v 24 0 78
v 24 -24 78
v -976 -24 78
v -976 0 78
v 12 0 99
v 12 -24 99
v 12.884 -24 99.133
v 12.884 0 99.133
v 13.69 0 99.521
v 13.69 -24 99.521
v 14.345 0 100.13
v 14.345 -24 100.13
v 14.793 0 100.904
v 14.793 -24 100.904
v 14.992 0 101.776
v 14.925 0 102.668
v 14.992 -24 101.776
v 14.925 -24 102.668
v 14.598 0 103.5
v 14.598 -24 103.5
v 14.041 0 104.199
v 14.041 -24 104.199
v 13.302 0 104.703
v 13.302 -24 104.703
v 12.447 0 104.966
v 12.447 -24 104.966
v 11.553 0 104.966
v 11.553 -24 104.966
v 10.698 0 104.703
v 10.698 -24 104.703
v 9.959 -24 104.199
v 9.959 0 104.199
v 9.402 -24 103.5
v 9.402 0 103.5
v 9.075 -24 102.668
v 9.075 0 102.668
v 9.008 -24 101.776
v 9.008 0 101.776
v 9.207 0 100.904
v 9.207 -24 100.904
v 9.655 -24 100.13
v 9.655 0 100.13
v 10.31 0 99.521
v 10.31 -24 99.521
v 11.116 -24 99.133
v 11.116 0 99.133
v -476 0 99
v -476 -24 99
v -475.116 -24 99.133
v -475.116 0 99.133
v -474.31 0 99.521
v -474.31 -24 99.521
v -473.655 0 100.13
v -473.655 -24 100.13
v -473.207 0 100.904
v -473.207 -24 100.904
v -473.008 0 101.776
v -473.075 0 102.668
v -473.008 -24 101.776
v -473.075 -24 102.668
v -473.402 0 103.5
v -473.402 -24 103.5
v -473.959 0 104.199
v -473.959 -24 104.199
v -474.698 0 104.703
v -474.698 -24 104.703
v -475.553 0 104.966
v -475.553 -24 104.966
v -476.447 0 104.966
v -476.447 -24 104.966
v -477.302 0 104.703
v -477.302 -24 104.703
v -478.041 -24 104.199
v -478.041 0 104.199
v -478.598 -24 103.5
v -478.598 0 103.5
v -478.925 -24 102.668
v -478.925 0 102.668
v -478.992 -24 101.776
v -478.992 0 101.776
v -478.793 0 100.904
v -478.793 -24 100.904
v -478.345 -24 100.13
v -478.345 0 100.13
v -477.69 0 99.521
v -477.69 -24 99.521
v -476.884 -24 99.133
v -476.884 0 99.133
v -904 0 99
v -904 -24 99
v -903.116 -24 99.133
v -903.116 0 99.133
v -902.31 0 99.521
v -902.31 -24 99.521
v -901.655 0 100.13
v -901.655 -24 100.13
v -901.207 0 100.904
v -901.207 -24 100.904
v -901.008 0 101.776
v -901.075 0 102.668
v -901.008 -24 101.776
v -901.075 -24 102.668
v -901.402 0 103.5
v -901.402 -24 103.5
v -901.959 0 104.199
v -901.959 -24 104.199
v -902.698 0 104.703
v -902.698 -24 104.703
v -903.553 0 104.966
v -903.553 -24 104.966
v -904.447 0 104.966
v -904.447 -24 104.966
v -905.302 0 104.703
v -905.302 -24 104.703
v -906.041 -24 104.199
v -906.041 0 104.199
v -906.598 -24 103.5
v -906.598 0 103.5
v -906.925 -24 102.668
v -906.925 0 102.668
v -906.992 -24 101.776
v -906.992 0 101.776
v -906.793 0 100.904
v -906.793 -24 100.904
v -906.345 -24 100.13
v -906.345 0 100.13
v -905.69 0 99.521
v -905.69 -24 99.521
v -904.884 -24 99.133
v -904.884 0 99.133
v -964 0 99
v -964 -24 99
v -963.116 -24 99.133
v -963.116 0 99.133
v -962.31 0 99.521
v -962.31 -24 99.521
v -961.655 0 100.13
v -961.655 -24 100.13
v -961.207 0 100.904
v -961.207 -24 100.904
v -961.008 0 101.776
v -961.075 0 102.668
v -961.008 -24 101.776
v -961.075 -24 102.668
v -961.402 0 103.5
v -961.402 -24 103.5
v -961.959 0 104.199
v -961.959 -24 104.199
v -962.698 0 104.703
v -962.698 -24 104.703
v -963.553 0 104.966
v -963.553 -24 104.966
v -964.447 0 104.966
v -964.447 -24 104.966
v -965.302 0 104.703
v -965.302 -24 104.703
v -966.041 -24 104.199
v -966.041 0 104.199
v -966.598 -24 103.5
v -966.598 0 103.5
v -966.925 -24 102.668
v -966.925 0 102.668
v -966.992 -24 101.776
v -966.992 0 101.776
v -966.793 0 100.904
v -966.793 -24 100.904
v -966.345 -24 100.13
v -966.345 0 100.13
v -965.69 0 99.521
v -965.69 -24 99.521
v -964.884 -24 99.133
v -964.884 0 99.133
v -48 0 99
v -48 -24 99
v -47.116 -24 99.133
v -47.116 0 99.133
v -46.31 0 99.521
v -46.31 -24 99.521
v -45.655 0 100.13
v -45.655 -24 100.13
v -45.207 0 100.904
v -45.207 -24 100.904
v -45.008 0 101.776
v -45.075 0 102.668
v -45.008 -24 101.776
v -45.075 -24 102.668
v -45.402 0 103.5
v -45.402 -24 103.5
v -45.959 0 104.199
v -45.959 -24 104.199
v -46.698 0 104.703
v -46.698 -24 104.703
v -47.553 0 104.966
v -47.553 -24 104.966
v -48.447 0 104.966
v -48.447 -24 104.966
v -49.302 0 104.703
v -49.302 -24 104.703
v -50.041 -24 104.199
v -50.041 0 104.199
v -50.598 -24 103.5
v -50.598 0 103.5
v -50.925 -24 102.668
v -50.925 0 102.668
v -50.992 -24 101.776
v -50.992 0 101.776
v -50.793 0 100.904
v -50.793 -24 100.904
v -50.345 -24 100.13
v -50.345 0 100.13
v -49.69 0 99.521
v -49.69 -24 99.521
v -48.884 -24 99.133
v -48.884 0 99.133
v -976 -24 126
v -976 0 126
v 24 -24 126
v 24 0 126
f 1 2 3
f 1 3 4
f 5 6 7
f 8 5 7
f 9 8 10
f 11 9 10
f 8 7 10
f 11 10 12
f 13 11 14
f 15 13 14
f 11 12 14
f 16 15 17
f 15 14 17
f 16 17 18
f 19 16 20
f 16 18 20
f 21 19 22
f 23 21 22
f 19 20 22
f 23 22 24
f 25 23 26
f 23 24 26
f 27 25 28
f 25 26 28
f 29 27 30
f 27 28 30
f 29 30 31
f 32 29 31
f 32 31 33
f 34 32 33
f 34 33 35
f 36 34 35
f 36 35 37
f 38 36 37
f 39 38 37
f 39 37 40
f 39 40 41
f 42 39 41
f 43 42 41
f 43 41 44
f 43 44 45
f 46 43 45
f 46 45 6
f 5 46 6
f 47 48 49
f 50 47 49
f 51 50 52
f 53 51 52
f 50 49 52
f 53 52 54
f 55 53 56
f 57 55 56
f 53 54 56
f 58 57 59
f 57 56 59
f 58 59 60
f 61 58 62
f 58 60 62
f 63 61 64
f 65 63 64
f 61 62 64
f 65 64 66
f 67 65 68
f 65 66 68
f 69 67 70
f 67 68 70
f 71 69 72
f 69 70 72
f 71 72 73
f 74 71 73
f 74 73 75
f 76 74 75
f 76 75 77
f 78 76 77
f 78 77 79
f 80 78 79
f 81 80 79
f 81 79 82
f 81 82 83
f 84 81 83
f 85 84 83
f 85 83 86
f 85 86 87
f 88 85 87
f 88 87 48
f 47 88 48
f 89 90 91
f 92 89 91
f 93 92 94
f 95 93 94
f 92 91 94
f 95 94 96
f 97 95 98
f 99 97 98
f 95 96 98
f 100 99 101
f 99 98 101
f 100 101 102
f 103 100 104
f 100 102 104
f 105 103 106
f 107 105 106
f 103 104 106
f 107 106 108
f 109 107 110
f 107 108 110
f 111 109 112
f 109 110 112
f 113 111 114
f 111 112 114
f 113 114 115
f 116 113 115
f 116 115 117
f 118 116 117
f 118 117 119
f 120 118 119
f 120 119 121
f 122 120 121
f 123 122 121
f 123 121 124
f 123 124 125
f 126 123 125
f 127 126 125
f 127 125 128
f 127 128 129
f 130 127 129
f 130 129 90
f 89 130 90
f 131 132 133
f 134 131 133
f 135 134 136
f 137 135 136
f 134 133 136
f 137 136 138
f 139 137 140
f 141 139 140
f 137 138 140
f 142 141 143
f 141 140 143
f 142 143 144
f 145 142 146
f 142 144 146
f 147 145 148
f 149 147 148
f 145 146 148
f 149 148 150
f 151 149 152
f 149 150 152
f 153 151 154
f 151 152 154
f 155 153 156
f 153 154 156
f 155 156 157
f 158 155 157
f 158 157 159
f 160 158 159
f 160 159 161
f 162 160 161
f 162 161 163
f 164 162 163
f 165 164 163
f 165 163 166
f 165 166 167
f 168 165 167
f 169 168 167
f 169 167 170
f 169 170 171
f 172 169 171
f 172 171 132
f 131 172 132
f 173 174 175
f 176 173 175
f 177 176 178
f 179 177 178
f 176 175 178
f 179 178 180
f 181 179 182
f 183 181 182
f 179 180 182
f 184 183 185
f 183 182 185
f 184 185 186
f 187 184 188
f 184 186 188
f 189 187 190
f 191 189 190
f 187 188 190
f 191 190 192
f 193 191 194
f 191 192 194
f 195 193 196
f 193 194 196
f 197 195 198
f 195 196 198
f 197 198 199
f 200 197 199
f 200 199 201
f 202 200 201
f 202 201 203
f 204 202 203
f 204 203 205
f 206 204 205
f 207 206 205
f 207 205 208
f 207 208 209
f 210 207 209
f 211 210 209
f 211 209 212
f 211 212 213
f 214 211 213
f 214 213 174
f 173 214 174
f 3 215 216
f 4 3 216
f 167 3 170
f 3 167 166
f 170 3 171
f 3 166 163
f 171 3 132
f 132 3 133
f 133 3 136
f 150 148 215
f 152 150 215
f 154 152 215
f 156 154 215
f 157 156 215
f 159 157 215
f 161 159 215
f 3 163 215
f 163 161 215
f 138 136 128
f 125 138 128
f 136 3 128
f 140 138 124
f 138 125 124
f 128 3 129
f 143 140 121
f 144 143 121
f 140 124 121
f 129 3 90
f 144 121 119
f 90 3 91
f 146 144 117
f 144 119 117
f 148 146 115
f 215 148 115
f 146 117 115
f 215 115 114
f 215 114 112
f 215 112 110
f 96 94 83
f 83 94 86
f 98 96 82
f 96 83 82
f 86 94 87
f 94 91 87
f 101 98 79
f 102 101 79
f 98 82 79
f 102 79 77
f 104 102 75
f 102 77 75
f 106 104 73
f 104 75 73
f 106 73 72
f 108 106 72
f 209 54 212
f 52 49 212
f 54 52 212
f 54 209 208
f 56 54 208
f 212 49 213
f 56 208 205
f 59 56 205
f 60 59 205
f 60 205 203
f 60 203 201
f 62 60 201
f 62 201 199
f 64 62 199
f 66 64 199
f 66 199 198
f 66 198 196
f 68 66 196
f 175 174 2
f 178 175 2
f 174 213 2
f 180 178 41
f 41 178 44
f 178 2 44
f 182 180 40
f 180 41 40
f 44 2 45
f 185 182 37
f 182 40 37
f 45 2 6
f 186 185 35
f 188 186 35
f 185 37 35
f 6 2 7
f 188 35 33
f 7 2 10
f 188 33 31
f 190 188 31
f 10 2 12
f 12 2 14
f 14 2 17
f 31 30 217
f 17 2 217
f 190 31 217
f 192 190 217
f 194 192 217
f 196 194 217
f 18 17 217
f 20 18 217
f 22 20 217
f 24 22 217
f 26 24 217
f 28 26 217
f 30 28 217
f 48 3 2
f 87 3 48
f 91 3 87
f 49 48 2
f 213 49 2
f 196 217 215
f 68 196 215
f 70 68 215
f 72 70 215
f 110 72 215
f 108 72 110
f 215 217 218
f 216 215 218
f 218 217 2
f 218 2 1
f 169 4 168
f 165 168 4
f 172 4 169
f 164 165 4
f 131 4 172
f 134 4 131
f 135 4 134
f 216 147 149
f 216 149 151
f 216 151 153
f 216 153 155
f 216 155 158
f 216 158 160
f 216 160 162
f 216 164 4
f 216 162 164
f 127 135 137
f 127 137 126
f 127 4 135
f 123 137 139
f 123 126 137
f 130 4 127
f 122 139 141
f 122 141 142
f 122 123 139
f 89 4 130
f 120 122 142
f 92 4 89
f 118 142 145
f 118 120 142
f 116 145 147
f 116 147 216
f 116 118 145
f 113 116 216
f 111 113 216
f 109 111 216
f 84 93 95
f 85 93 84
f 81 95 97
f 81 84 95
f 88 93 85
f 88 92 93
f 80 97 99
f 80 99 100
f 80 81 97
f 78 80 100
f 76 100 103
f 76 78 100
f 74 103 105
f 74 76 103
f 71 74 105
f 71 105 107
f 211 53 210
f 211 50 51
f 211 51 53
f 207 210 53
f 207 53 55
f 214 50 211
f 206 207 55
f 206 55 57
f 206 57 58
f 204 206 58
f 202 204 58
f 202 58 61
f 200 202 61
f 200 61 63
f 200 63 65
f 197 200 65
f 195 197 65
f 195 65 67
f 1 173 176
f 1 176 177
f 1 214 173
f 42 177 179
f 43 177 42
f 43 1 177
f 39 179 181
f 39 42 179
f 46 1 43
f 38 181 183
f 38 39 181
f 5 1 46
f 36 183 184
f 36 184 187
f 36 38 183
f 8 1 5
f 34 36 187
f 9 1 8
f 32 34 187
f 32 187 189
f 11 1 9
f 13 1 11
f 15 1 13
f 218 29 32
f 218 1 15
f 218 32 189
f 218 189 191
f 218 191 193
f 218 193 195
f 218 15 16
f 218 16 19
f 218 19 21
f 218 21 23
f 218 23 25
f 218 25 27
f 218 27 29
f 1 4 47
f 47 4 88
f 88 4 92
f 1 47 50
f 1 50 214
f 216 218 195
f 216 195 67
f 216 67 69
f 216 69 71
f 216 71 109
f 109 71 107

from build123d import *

# Parameters (mm, degrees)
SKETCH024_W     = 24
SKETCH024_H     = 48
PAD010_DEPTH    = 1000
SKETCH025_R     = 3
POCKET014_DEPTH = 24.001
SKETCH072_R     = 3
POCKET032_DEPTH = 24.001


with BuildPart() as part:
    # Sketch024 → Pad010 (new body)
    with BuildSketch(Plane.YZ):
        with Locations((12, 24)):
            Rectangle(SKETCH024_W, SKETCH024_H)
    extrude(amount=-PAD010_DEPTH)

    # Sketch025 (on Face4 of Pad010) → Pocket014 (cut, through all)
    with BuildSketch(Plane(origin=(0, 0, 0), x_dir=(0, 0, -1), z_dir=(0, -1, 0))):
        with Locations((-24, -12)):
            Circle(SKETCH025_R)
        with Locations((-24, -988)):
            Circle(SKETCH025_R)
    extrude(amount=-POCKET014_DEPTH, mode=Mode.SUBTRACT)

    # Sketch072 (on Face2 of Pocket014) → Pocket032 (cut, through all)
    with BuildSketch(Plane(origin=(0, 0, 0), x_dir=(0, 0, -1), z_dir=(0, -1, 0))):
        with Locations((-24, -928)):
            Circle(SKETCH072_R)
        with Locations((-24, -72)):
            Circle(SKETCH072_R)
        with Locations((-24, -500)):
            Circle(SKETCH072_R)
    extrude(amount=-POCKET032_DEPTH, mode=Mode.SUBTRACT)


with BuildPart() as part_1:
    # Body012 placement: moved
    add(part.part.moved(Location((24, -24, 78))))


solid = part_1.part
